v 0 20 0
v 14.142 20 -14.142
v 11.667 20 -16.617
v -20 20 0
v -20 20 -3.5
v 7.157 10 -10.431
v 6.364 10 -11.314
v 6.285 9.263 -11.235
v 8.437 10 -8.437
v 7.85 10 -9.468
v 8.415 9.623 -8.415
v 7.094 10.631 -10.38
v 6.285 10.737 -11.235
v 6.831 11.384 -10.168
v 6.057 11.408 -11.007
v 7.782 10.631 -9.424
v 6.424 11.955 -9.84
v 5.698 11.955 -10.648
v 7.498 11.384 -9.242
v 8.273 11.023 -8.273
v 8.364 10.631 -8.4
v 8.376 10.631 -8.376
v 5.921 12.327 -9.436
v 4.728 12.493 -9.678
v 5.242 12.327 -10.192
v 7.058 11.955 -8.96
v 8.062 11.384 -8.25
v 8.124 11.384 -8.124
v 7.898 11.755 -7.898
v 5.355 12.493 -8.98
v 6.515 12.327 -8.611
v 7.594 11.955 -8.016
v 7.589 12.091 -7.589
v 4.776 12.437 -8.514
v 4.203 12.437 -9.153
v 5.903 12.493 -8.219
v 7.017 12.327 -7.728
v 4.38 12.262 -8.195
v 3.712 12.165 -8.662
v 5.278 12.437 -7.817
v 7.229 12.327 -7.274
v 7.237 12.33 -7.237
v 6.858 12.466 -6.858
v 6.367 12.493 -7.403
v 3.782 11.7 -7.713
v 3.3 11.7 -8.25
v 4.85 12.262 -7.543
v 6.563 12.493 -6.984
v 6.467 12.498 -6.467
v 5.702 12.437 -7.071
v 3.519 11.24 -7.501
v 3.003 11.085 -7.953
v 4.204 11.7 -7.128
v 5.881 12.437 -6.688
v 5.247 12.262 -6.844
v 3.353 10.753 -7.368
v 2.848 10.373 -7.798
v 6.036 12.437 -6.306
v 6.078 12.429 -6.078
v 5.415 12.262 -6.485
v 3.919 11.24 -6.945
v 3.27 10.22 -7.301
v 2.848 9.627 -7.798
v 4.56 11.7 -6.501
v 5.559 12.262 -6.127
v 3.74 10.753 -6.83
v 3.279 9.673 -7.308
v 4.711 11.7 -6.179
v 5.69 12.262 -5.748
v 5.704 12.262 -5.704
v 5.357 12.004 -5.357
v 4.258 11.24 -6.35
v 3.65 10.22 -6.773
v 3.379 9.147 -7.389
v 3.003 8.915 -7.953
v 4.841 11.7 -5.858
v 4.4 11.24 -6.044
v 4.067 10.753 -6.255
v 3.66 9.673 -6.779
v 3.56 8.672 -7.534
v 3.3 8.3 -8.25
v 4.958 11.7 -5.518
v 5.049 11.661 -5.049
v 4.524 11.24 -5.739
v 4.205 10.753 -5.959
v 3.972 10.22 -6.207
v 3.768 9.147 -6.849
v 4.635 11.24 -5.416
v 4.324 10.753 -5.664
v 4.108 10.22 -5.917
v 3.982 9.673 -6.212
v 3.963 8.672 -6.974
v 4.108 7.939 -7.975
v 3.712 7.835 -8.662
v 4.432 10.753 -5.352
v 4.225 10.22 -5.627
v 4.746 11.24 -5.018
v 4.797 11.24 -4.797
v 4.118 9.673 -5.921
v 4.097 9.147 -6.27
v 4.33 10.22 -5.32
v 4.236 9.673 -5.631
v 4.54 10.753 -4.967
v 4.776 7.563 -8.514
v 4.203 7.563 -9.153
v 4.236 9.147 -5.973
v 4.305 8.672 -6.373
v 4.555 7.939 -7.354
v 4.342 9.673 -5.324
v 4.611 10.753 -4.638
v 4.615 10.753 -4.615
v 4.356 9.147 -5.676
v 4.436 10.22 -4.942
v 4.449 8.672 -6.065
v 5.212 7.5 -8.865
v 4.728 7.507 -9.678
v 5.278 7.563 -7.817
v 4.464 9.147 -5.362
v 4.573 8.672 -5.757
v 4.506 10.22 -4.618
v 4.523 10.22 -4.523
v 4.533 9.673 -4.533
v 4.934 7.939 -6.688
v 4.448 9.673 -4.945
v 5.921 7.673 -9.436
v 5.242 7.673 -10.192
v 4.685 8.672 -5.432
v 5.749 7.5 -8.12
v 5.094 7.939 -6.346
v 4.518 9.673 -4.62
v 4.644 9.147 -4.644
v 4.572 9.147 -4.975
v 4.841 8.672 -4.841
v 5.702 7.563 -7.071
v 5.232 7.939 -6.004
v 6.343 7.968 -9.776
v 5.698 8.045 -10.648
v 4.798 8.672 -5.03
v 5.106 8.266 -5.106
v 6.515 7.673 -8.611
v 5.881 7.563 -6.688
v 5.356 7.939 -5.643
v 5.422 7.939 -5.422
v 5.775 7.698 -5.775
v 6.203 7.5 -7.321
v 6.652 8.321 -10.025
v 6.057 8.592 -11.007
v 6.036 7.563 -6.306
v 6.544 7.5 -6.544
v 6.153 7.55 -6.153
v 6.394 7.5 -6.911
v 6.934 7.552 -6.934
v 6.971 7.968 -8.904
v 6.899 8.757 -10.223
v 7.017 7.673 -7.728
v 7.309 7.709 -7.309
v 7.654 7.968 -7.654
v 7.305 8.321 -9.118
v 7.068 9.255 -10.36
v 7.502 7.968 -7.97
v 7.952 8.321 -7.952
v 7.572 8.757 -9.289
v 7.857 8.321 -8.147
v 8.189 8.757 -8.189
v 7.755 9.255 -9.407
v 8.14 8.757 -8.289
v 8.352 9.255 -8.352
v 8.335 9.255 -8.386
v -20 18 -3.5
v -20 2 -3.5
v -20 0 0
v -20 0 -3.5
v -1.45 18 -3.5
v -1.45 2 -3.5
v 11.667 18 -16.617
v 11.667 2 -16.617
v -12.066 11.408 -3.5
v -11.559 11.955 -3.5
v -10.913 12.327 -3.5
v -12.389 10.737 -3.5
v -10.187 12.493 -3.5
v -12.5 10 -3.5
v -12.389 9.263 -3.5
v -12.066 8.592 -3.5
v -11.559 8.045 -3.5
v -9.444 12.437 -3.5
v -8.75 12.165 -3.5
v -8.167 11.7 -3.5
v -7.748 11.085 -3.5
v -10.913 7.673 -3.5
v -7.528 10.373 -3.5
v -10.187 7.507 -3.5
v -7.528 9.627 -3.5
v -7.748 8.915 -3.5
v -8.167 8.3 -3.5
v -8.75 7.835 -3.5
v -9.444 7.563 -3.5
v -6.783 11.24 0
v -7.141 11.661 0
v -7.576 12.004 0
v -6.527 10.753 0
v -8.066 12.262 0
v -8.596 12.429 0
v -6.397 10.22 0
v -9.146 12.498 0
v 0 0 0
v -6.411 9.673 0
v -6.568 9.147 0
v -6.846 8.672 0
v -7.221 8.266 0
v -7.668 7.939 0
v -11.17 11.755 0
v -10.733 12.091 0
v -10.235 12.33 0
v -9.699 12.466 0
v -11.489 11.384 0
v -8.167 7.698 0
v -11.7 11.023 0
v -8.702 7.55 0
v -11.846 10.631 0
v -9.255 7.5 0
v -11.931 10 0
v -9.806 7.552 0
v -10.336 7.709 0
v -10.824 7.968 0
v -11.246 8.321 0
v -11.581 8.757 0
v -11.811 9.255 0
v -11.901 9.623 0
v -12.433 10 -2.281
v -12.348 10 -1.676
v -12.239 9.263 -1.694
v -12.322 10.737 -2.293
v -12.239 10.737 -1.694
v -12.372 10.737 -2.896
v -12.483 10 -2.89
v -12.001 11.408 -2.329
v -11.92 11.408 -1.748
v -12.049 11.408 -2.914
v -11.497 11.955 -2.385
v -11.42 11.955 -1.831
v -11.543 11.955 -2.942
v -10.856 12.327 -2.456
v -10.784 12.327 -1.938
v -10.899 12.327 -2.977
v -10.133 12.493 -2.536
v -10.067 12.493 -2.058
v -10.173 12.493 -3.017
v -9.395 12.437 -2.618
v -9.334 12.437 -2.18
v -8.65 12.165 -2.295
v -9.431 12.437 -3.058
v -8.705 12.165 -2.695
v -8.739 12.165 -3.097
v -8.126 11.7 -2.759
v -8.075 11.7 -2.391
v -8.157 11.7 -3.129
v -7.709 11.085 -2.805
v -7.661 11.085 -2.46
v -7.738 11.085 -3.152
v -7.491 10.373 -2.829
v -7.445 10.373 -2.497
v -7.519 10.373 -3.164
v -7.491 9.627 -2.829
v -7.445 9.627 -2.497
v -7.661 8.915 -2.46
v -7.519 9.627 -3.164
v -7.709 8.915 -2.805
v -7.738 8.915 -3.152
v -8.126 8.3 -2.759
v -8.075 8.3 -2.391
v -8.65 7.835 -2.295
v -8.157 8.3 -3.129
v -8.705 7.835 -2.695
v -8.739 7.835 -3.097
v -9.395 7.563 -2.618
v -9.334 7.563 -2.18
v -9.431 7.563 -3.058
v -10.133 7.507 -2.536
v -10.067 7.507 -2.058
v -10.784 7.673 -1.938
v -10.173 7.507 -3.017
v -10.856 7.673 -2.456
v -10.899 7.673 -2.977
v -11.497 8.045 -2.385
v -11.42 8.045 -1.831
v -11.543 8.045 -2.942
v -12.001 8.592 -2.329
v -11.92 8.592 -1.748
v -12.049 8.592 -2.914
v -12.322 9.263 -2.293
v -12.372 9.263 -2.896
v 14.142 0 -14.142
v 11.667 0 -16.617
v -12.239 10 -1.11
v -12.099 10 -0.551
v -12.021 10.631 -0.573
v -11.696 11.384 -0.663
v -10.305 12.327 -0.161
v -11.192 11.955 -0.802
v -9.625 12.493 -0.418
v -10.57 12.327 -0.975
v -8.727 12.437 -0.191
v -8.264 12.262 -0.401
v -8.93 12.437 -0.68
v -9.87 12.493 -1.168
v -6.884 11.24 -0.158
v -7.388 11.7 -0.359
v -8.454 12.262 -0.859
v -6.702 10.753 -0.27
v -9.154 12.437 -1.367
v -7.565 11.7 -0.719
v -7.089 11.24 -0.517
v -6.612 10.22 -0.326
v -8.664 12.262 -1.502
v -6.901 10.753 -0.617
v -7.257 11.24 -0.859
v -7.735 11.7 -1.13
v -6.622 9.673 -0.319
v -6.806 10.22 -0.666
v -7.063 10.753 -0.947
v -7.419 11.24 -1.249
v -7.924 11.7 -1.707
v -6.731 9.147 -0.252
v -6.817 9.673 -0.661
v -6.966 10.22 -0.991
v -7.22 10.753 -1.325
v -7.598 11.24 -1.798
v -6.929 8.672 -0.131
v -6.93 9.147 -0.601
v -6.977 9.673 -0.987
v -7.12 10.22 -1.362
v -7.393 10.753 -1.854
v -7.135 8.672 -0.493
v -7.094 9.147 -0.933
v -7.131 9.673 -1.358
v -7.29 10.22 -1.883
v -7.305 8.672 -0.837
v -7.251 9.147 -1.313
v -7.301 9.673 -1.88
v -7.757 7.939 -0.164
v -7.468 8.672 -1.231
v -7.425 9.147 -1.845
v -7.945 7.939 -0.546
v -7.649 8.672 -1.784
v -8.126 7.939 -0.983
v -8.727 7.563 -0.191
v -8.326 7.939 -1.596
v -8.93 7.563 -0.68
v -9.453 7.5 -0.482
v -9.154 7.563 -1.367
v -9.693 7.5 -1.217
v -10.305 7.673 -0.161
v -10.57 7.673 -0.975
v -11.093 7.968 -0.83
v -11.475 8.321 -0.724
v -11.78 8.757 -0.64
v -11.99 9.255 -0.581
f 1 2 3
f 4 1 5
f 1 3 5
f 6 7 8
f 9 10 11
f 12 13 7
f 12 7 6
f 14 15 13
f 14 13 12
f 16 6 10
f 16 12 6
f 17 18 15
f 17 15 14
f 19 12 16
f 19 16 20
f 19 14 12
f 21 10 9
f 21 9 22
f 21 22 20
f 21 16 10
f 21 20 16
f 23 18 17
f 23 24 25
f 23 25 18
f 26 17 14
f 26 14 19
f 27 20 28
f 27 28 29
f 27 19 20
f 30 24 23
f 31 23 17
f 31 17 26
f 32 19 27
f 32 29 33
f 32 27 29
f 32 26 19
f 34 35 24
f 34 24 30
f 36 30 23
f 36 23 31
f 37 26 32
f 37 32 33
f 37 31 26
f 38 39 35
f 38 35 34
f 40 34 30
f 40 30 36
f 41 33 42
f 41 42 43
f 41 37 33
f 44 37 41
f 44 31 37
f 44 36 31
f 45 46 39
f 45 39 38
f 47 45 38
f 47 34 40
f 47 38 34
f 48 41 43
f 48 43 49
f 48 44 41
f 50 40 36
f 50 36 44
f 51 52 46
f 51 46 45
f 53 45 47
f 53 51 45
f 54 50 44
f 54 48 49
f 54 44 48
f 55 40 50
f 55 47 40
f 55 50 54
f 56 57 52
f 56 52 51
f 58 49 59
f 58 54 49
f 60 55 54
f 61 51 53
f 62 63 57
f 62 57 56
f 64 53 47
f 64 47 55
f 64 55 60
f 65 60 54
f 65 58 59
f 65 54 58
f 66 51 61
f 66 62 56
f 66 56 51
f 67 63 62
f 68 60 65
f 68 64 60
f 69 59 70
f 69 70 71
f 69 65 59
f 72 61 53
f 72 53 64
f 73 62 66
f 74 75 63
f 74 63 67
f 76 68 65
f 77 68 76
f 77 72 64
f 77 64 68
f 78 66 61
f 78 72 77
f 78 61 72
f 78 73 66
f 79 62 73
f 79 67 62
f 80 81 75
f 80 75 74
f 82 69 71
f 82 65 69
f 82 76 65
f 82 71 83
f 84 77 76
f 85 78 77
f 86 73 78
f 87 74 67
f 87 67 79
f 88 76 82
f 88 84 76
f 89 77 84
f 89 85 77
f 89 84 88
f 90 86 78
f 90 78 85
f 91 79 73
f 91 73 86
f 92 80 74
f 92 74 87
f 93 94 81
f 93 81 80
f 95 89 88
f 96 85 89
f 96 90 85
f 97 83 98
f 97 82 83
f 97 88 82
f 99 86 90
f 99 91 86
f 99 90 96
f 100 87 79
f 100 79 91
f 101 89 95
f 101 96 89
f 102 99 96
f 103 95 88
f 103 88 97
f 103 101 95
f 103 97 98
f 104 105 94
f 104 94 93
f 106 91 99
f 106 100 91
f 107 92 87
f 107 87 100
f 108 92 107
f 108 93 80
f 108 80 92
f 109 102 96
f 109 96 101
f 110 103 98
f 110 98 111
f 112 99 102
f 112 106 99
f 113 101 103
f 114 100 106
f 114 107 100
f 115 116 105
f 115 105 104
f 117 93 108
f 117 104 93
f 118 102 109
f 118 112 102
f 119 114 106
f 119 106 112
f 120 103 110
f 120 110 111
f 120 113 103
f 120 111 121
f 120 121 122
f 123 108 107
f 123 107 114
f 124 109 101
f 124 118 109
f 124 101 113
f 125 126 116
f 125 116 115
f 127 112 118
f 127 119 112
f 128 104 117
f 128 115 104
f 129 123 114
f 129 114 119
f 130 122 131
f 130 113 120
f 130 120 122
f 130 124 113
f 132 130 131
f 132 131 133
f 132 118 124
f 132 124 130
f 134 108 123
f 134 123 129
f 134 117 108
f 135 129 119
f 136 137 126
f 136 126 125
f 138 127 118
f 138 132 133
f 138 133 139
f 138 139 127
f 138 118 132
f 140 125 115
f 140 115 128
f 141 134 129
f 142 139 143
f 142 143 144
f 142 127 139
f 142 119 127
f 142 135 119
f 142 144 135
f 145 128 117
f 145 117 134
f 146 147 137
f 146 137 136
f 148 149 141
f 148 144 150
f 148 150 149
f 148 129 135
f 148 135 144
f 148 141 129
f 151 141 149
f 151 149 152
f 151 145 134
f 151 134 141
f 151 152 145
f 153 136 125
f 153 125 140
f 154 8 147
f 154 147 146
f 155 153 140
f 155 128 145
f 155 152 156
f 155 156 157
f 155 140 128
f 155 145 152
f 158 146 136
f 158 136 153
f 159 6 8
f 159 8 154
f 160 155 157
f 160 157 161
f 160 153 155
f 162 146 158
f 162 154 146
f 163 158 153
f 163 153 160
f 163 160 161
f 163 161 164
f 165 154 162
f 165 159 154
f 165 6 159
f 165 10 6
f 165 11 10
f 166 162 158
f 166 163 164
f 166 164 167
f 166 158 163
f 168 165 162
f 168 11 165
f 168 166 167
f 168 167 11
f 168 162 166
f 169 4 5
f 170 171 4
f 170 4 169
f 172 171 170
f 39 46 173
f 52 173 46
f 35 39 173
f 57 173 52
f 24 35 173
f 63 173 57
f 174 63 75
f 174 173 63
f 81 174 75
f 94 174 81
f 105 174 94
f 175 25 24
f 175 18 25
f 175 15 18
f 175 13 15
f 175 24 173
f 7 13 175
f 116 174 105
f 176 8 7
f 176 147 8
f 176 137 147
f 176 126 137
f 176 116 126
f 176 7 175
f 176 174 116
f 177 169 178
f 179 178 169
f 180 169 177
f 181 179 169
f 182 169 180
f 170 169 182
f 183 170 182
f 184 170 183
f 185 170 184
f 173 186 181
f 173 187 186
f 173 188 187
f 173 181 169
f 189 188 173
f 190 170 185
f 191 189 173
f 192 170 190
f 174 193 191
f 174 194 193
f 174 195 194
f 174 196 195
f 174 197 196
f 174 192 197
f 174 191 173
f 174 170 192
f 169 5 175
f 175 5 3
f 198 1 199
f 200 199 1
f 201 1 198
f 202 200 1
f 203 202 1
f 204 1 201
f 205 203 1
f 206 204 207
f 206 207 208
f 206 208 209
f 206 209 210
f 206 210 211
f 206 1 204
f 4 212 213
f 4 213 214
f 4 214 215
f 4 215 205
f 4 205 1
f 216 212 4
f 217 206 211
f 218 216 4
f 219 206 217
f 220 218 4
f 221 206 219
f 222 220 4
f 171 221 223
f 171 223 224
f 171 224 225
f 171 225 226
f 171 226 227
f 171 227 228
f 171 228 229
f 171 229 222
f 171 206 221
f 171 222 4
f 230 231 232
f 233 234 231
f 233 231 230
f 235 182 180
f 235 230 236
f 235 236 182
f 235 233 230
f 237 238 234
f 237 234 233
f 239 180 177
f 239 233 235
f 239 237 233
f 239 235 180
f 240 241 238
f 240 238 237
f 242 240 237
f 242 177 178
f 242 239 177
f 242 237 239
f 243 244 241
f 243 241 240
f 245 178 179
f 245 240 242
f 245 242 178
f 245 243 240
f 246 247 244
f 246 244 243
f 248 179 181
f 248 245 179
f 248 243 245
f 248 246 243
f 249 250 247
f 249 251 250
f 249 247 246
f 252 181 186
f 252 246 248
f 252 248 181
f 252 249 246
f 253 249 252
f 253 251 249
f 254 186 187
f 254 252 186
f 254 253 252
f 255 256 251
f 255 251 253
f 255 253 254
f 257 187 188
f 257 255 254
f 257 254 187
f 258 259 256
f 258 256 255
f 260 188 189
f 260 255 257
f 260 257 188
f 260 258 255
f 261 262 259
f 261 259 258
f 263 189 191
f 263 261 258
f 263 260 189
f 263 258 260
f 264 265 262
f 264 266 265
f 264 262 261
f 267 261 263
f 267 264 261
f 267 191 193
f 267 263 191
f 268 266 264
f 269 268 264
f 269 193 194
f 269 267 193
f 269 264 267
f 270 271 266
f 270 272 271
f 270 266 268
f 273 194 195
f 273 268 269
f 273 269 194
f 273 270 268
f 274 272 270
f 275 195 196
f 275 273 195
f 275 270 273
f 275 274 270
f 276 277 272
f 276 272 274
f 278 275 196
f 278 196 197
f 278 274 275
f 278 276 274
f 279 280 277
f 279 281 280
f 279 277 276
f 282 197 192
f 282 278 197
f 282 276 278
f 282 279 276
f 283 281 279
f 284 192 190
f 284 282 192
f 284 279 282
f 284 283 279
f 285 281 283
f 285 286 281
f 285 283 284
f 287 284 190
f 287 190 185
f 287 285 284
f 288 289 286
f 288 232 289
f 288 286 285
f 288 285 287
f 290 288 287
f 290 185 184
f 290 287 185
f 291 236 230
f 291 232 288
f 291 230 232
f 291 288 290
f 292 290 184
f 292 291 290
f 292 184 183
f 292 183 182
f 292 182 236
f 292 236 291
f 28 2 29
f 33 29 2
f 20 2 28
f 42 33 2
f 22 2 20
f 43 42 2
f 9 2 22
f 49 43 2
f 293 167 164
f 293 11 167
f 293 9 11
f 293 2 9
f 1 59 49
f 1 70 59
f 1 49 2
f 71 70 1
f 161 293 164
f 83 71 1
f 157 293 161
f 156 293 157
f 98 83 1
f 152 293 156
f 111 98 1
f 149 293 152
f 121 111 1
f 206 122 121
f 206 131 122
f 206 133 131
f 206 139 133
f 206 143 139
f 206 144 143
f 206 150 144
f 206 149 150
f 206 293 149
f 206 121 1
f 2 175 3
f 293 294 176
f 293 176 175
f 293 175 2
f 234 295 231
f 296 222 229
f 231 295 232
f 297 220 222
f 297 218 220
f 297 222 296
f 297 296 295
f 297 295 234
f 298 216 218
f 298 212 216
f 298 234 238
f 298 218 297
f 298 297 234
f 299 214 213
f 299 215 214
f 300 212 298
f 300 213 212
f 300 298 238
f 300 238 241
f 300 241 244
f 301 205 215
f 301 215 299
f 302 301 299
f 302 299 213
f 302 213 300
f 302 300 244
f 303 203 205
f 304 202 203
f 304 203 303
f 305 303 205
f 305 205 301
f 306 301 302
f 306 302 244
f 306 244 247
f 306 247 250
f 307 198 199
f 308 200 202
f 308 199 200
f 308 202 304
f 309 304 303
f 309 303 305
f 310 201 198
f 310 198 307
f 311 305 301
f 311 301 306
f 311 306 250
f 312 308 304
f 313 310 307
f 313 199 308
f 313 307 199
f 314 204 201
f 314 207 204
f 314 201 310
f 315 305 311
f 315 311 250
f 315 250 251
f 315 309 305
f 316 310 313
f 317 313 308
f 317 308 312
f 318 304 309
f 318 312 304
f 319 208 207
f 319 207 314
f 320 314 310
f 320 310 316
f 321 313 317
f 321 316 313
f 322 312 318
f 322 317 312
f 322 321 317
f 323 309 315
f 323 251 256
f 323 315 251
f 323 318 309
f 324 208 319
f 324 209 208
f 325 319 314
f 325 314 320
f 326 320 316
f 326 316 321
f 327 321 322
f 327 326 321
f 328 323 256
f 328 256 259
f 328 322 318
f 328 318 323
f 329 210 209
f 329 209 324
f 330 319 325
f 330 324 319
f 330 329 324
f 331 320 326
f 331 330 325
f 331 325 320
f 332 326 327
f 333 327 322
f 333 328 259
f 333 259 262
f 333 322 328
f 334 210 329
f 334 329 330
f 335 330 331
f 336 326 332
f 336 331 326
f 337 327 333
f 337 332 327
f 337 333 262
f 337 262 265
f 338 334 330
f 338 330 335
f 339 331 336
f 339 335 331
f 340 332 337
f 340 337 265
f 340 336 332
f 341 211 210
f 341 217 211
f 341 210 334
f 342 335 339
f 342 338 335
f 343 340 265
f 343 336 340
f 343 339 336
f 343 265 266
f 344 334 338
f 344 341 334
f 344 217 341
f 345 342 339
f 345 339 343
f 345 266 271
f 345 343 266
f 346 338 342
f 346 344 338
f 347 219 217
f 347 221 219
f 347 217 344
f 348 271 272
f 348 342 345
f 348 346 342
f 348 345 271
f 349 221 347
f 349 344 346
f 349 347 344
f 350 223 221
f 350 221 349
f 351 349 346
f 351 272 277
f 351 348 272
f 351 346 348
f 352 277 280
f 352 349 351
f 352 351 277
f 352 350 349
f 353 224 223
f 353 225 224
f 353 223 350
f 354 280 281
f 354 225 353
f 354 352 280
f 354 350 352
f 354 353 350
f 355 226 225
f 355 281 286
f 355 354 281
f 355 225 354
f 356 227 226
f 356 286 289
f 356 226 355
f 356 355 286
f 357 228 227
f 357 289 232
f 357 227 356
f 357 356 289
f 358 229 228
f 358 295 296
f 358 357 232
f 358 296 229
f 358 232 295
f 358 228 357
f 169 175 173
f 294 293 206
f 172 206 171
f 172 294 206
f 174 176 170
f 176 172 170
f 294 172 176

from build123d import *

# Parameters (mm, degrees)
BOSS_EXTRUDE1_DEPTH = 20
BOSS_EXTRUDE2_DEPTH = 2
BOSS_EXTRUDE3_START = -20
BOSS_EXTRUDE3_DEPTH = 2
SKETCH3_R           = 2.5


with BuildPart() as part:
    # Sketch1 → Boss-Extrude1 (new body)
    with BuildSketch(Plane(origin=(0, 0, 0), x_dir=(1, 0, 0), z_dir=(0, 1, 0))):
        Polygon((-20, 3.5), (-1.449747468, 3.5), (11.66726189, 16.617009358), (14.142135624, 14.142135624), (0, 0), (-20, 0), align=None)
    extrude(amount=BOSS_EXTRUDE1_DEPTH)

    # Sketch2 → Boss-Extrude2 (add)
    with BuildSketch(Plane(origin=(0, 20, 0), x_dir=(1, 0, 0), z_dir=(0, 1, 0))):
        Polygon((-20, 3.5), (11.66726189, 16.617009358), (-1.449747468, 3.5), align=None)
    extrude(amount=-BOSS_EXTRUDE2_DEPTH)

    # Sketch2<2> → Boss-Extrude3 (add)
    with BuildSketch(Plane(origin=(0, 20, 0), x_dir=(1, 0, 0), z_dir=(0, 1, 0)).offset(BOSS_EXTRUDE3_START)):
        Polygon((-20, 3.5), (11.66726189, 16.617009358), (-1.449747468, 3.5), align=None)
    extrude(amount=BOSS_EXTRUDE3_DEPTH)

    # Sketch3 → Cut-Revolve1 (revolve, cut)
    with BuildSketch(Plane(origin=(0, 0, -3.5), x_dir=(-1, 0, 0), z_dir=(0, 0, -1)), mode=Mode.PRIVATE) as cut_revolve1_sk:
        with Locations((10, 10)):
            Circle(SKETCH3_R)
    revolve(cut_revolve1_sk.sketch.rotate(Axis((-1.449747468, 20, -3.5), (0, -1, 0)), 350.498874786), axis=Axis((-1.449747468, 20, -3.5), (0, -1, 0)), mode=Mode.SUBTRACT)


solid = part.part
